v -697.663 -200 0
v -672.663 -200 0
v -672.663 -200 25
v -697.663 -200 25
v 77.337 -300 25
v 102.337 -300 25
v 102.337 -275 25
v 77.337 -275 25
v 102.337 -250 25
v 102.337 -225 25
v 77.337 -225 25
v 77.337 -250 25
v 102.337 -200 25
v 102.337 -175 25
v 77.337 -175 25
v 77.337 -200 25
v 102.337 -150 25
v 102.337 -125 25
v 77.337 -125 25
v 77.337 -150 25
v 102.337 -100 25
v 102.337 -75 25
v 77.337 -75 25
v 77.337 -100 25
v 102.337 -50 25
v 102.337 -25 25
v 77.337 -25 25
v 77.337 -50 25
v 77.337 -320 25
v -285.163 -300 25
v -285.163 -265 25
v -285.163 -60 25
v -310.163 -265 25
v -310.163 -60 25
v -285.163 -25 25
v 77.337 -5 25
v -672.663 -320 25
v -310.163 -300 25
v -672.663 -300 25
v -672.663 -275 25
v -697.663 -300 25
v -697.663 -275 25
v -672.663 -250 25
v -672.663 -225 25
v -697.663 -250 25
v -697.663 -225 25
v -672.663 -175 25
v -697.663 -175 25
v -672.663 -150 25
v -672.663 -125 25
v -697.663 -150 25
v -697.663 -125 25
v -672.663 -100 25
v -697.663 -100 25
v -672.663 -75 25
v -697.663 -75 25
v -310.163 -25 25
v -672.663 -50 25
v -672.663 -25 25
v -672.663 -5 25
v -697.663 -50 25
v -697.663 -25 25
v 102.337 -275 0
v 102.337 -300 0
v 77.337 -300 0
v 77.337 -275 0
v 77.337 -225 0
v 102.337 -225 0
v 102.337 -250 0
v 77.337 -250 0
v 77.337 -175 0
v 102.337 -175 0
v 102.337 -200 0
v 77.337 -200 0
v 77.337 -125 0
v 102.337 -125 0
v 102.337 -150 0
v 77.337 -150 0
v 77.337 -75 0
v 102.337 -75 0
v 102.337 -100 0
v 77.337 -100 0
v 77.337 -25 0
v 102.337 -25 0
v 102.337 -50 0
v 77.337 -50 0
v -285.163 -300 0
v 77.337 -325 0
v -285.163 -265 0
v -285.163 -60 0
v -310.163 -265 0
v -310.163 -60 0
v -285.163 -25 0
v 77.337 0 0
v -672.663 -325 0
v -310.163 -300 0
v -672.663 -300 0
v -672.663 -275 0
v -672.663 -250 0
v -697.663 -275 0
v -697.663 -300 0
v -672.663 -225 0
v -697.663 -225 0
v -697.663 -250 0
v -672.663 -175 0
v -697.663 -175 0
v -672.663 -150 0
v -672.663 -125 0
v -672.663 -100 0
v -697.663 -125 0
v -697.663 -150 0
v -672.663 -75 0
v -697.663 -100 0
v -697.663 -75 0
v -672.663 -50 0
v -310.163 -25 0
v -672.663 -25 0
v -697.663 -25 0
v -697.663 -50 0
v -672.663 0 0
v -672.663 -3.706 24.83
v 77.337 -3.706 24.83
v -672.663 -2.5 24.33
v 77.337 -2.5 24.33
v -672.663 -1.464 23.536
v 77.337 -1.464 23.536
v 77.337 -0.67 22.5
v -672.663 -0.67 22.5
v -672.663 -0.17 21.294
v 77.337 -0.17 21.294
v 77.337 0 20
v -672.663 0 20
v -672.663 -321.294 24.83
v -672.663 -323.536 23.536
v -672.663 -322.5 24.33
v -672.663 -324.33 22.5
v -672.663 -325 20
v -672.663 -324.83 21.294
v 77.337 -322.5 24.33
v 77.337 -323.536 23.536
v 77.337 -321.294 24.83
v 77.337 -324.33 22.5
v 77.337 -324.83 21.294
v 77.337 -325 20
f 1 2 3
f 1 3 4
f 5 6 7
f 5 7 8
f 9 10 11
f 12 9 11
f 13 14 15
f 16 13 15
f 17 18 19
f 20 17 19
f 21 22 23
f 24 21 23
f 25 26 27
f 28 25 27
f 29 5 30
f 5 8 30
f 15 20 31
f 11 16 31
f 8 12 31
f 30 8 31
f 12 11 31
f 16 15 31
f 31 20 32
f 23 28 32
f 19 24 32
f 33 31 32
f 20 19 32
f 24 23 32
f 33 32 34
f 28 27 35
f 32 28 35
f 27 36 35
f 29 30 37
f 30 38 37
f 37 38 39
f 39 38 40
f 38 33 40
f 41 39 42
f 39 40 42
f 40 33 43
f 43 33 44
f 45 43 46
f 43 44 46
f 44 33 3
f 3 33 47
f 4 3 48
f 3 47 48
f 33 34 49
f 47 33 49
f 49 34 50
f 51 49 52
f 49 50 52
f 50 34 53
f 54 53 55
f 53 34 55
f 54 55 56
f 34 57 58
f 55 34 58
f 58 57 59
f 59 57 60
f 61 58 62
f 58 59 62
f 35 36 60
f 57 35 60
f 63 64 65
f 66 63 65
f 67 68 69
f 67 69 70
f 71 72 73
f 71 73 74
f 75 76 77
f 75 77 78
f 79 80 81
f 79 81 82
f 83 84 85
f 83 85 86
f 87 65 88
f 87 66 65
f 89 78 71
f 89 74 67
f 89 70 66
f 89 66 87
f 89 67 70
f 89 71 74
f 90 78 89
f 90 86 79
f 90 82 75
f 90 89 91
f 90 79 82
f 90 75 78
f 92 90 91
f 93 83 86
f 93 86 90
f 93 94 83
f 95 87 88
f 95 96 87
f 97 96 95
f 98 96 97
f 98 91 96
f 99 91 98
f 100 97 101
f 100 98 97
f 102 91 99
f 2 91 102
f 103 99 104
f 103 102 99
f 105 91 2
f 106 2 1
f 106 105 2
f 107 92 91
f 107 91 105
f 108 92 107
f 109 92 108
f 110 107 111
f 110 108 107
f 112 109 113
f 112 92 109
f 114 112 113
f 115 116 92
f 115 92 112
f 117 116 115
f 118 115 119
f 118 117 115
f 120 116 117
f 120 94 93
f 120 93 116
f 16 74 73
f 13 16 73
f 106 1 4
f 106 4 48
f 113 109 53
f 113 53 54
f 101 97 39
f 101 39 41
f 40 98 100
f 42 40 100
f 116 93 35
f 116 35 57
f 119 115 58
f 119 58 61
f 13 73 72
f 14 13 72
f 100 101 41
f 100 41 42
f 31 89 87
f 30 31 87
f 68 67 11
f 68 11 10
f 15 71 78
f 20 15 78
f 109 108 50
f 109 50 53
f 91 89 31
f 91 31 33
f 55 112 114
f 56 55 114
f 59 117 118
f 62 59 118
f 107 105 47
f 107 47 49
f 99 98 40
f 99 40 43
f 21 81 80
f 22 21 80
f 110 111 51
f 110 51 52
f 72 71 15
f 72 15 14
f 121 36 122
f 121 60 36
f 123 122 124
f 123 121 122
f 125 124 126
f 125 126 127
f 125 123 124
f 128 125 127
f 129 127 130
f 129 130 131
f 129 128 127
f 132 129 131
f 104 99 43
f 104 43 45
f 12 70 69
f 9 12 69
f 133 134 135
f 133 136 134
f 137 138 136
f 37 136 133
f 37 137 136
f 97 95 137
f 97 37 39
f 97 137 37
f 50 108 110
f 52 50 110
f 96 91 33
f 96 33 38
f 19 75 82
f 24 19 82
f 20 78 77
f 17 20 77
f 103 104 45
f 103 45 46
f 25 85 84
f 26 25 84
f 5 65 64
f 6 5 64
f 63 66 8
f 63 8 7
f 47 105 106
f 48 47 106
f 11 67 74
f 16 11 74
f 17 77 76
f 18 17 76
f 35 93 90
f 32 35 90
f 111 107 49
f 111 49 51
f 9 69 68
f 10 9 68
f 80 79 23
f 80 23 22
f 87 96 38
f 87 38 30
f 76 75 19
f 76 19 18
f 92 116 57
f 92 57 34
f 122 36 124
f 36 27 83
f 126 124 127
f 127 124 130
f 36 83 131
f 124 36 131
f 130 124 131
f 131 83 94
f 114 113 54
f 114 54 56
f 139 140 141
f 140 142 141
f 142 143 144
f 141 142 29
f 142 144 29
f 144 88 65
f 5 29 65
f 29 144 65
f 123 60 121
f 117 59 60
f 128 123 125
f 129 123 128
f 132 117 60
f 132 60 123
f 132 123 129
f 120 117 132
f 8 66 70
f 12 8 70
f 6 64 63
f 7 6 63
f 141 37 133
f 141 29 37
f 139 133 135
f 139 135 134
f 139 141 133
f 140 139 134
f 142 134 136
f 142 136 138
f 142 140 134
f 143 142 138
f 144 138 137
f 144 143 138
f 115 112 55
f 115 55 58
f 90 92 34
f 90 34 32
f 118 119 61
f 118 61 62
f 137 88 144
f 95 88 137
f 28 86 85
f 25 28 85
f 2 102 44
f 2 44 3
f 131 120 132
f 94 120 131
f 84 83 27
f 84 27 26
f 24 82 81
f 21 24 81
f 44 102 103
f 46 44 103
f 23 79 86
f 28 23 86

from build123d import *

# Parameters (mm, degrees)
F0_W     = 25
F0_H     = 25
F1_DEPTH = 25
F3_R     = 5
F4_R     = 5


with BuildPart() as f1:
    # F0 (on Top) → F1 (new body)
    with BuildSketch(Plane.XY):
        with Locations((89.836757, -287.5)):
            Rectangle(F0_W, F0_H)
        with Locations((89.836757, -237.5)):
            Rectangle(F0_W, F0_H)
        with Locations((89.836757, -187.5)):
            Rectangle(F0_W, F0_H)
        with Locations((89.836757, -137.5)):
            Rectangle(F0_W, F0_H)
        with Locations((89.836757, -87.5)):
            Rectangle(F0_W, F0_H)
        with Locations((89.836757, -37.5)):
            Rectangle(F0_W, F0_H)
        Polygon((77.336757, 0), (-297.663243, 0), (-297.663243, -25), (-285.163243, -25), (-285.163243, -60), (-297.663243, -60), (-297.663243, -265), (-285.163243, -265), (-285.163243, -300), (-297.663243, -300), (-297.663243, -325), (77.336757, -325), (77.336757, -300), (77.336757, -275), (77.336757, -250), (77.336757, -225), (77.336757, -200), (77.336757, -175), (77.336757, -150), (77.336757, -125), (77.336757, -100), (77.336757, -75), (77.336757, -50), (77.336757, -25), align=None)
    extrude(amount=F1_DEPTH)

    # F2: F1 across face


with BuildPart() as f1_1:
    add(f1.part)
    add(f1.part.mirror(Plane(origin=(-297.663243, -162.5, 12.5), x_dir=(0, -1, 0), z_dir=(-1, 0, 0))))

    # F3
    f3_edges = [f1_1.edges().sort_by_distance(p)[0] for p in [
        (-297.663243, 0, 25),
    ]]
    fillet(f3_edges, radius=F3_R)

    # F4
    f4_edges = [f1_1.edges().sort_by_distance(p)[0] for p in [
        (-297.663243, -325, 25),
    ]]
    fillet(f4_edges, radius=F4_R)


solid = f1_1.part
